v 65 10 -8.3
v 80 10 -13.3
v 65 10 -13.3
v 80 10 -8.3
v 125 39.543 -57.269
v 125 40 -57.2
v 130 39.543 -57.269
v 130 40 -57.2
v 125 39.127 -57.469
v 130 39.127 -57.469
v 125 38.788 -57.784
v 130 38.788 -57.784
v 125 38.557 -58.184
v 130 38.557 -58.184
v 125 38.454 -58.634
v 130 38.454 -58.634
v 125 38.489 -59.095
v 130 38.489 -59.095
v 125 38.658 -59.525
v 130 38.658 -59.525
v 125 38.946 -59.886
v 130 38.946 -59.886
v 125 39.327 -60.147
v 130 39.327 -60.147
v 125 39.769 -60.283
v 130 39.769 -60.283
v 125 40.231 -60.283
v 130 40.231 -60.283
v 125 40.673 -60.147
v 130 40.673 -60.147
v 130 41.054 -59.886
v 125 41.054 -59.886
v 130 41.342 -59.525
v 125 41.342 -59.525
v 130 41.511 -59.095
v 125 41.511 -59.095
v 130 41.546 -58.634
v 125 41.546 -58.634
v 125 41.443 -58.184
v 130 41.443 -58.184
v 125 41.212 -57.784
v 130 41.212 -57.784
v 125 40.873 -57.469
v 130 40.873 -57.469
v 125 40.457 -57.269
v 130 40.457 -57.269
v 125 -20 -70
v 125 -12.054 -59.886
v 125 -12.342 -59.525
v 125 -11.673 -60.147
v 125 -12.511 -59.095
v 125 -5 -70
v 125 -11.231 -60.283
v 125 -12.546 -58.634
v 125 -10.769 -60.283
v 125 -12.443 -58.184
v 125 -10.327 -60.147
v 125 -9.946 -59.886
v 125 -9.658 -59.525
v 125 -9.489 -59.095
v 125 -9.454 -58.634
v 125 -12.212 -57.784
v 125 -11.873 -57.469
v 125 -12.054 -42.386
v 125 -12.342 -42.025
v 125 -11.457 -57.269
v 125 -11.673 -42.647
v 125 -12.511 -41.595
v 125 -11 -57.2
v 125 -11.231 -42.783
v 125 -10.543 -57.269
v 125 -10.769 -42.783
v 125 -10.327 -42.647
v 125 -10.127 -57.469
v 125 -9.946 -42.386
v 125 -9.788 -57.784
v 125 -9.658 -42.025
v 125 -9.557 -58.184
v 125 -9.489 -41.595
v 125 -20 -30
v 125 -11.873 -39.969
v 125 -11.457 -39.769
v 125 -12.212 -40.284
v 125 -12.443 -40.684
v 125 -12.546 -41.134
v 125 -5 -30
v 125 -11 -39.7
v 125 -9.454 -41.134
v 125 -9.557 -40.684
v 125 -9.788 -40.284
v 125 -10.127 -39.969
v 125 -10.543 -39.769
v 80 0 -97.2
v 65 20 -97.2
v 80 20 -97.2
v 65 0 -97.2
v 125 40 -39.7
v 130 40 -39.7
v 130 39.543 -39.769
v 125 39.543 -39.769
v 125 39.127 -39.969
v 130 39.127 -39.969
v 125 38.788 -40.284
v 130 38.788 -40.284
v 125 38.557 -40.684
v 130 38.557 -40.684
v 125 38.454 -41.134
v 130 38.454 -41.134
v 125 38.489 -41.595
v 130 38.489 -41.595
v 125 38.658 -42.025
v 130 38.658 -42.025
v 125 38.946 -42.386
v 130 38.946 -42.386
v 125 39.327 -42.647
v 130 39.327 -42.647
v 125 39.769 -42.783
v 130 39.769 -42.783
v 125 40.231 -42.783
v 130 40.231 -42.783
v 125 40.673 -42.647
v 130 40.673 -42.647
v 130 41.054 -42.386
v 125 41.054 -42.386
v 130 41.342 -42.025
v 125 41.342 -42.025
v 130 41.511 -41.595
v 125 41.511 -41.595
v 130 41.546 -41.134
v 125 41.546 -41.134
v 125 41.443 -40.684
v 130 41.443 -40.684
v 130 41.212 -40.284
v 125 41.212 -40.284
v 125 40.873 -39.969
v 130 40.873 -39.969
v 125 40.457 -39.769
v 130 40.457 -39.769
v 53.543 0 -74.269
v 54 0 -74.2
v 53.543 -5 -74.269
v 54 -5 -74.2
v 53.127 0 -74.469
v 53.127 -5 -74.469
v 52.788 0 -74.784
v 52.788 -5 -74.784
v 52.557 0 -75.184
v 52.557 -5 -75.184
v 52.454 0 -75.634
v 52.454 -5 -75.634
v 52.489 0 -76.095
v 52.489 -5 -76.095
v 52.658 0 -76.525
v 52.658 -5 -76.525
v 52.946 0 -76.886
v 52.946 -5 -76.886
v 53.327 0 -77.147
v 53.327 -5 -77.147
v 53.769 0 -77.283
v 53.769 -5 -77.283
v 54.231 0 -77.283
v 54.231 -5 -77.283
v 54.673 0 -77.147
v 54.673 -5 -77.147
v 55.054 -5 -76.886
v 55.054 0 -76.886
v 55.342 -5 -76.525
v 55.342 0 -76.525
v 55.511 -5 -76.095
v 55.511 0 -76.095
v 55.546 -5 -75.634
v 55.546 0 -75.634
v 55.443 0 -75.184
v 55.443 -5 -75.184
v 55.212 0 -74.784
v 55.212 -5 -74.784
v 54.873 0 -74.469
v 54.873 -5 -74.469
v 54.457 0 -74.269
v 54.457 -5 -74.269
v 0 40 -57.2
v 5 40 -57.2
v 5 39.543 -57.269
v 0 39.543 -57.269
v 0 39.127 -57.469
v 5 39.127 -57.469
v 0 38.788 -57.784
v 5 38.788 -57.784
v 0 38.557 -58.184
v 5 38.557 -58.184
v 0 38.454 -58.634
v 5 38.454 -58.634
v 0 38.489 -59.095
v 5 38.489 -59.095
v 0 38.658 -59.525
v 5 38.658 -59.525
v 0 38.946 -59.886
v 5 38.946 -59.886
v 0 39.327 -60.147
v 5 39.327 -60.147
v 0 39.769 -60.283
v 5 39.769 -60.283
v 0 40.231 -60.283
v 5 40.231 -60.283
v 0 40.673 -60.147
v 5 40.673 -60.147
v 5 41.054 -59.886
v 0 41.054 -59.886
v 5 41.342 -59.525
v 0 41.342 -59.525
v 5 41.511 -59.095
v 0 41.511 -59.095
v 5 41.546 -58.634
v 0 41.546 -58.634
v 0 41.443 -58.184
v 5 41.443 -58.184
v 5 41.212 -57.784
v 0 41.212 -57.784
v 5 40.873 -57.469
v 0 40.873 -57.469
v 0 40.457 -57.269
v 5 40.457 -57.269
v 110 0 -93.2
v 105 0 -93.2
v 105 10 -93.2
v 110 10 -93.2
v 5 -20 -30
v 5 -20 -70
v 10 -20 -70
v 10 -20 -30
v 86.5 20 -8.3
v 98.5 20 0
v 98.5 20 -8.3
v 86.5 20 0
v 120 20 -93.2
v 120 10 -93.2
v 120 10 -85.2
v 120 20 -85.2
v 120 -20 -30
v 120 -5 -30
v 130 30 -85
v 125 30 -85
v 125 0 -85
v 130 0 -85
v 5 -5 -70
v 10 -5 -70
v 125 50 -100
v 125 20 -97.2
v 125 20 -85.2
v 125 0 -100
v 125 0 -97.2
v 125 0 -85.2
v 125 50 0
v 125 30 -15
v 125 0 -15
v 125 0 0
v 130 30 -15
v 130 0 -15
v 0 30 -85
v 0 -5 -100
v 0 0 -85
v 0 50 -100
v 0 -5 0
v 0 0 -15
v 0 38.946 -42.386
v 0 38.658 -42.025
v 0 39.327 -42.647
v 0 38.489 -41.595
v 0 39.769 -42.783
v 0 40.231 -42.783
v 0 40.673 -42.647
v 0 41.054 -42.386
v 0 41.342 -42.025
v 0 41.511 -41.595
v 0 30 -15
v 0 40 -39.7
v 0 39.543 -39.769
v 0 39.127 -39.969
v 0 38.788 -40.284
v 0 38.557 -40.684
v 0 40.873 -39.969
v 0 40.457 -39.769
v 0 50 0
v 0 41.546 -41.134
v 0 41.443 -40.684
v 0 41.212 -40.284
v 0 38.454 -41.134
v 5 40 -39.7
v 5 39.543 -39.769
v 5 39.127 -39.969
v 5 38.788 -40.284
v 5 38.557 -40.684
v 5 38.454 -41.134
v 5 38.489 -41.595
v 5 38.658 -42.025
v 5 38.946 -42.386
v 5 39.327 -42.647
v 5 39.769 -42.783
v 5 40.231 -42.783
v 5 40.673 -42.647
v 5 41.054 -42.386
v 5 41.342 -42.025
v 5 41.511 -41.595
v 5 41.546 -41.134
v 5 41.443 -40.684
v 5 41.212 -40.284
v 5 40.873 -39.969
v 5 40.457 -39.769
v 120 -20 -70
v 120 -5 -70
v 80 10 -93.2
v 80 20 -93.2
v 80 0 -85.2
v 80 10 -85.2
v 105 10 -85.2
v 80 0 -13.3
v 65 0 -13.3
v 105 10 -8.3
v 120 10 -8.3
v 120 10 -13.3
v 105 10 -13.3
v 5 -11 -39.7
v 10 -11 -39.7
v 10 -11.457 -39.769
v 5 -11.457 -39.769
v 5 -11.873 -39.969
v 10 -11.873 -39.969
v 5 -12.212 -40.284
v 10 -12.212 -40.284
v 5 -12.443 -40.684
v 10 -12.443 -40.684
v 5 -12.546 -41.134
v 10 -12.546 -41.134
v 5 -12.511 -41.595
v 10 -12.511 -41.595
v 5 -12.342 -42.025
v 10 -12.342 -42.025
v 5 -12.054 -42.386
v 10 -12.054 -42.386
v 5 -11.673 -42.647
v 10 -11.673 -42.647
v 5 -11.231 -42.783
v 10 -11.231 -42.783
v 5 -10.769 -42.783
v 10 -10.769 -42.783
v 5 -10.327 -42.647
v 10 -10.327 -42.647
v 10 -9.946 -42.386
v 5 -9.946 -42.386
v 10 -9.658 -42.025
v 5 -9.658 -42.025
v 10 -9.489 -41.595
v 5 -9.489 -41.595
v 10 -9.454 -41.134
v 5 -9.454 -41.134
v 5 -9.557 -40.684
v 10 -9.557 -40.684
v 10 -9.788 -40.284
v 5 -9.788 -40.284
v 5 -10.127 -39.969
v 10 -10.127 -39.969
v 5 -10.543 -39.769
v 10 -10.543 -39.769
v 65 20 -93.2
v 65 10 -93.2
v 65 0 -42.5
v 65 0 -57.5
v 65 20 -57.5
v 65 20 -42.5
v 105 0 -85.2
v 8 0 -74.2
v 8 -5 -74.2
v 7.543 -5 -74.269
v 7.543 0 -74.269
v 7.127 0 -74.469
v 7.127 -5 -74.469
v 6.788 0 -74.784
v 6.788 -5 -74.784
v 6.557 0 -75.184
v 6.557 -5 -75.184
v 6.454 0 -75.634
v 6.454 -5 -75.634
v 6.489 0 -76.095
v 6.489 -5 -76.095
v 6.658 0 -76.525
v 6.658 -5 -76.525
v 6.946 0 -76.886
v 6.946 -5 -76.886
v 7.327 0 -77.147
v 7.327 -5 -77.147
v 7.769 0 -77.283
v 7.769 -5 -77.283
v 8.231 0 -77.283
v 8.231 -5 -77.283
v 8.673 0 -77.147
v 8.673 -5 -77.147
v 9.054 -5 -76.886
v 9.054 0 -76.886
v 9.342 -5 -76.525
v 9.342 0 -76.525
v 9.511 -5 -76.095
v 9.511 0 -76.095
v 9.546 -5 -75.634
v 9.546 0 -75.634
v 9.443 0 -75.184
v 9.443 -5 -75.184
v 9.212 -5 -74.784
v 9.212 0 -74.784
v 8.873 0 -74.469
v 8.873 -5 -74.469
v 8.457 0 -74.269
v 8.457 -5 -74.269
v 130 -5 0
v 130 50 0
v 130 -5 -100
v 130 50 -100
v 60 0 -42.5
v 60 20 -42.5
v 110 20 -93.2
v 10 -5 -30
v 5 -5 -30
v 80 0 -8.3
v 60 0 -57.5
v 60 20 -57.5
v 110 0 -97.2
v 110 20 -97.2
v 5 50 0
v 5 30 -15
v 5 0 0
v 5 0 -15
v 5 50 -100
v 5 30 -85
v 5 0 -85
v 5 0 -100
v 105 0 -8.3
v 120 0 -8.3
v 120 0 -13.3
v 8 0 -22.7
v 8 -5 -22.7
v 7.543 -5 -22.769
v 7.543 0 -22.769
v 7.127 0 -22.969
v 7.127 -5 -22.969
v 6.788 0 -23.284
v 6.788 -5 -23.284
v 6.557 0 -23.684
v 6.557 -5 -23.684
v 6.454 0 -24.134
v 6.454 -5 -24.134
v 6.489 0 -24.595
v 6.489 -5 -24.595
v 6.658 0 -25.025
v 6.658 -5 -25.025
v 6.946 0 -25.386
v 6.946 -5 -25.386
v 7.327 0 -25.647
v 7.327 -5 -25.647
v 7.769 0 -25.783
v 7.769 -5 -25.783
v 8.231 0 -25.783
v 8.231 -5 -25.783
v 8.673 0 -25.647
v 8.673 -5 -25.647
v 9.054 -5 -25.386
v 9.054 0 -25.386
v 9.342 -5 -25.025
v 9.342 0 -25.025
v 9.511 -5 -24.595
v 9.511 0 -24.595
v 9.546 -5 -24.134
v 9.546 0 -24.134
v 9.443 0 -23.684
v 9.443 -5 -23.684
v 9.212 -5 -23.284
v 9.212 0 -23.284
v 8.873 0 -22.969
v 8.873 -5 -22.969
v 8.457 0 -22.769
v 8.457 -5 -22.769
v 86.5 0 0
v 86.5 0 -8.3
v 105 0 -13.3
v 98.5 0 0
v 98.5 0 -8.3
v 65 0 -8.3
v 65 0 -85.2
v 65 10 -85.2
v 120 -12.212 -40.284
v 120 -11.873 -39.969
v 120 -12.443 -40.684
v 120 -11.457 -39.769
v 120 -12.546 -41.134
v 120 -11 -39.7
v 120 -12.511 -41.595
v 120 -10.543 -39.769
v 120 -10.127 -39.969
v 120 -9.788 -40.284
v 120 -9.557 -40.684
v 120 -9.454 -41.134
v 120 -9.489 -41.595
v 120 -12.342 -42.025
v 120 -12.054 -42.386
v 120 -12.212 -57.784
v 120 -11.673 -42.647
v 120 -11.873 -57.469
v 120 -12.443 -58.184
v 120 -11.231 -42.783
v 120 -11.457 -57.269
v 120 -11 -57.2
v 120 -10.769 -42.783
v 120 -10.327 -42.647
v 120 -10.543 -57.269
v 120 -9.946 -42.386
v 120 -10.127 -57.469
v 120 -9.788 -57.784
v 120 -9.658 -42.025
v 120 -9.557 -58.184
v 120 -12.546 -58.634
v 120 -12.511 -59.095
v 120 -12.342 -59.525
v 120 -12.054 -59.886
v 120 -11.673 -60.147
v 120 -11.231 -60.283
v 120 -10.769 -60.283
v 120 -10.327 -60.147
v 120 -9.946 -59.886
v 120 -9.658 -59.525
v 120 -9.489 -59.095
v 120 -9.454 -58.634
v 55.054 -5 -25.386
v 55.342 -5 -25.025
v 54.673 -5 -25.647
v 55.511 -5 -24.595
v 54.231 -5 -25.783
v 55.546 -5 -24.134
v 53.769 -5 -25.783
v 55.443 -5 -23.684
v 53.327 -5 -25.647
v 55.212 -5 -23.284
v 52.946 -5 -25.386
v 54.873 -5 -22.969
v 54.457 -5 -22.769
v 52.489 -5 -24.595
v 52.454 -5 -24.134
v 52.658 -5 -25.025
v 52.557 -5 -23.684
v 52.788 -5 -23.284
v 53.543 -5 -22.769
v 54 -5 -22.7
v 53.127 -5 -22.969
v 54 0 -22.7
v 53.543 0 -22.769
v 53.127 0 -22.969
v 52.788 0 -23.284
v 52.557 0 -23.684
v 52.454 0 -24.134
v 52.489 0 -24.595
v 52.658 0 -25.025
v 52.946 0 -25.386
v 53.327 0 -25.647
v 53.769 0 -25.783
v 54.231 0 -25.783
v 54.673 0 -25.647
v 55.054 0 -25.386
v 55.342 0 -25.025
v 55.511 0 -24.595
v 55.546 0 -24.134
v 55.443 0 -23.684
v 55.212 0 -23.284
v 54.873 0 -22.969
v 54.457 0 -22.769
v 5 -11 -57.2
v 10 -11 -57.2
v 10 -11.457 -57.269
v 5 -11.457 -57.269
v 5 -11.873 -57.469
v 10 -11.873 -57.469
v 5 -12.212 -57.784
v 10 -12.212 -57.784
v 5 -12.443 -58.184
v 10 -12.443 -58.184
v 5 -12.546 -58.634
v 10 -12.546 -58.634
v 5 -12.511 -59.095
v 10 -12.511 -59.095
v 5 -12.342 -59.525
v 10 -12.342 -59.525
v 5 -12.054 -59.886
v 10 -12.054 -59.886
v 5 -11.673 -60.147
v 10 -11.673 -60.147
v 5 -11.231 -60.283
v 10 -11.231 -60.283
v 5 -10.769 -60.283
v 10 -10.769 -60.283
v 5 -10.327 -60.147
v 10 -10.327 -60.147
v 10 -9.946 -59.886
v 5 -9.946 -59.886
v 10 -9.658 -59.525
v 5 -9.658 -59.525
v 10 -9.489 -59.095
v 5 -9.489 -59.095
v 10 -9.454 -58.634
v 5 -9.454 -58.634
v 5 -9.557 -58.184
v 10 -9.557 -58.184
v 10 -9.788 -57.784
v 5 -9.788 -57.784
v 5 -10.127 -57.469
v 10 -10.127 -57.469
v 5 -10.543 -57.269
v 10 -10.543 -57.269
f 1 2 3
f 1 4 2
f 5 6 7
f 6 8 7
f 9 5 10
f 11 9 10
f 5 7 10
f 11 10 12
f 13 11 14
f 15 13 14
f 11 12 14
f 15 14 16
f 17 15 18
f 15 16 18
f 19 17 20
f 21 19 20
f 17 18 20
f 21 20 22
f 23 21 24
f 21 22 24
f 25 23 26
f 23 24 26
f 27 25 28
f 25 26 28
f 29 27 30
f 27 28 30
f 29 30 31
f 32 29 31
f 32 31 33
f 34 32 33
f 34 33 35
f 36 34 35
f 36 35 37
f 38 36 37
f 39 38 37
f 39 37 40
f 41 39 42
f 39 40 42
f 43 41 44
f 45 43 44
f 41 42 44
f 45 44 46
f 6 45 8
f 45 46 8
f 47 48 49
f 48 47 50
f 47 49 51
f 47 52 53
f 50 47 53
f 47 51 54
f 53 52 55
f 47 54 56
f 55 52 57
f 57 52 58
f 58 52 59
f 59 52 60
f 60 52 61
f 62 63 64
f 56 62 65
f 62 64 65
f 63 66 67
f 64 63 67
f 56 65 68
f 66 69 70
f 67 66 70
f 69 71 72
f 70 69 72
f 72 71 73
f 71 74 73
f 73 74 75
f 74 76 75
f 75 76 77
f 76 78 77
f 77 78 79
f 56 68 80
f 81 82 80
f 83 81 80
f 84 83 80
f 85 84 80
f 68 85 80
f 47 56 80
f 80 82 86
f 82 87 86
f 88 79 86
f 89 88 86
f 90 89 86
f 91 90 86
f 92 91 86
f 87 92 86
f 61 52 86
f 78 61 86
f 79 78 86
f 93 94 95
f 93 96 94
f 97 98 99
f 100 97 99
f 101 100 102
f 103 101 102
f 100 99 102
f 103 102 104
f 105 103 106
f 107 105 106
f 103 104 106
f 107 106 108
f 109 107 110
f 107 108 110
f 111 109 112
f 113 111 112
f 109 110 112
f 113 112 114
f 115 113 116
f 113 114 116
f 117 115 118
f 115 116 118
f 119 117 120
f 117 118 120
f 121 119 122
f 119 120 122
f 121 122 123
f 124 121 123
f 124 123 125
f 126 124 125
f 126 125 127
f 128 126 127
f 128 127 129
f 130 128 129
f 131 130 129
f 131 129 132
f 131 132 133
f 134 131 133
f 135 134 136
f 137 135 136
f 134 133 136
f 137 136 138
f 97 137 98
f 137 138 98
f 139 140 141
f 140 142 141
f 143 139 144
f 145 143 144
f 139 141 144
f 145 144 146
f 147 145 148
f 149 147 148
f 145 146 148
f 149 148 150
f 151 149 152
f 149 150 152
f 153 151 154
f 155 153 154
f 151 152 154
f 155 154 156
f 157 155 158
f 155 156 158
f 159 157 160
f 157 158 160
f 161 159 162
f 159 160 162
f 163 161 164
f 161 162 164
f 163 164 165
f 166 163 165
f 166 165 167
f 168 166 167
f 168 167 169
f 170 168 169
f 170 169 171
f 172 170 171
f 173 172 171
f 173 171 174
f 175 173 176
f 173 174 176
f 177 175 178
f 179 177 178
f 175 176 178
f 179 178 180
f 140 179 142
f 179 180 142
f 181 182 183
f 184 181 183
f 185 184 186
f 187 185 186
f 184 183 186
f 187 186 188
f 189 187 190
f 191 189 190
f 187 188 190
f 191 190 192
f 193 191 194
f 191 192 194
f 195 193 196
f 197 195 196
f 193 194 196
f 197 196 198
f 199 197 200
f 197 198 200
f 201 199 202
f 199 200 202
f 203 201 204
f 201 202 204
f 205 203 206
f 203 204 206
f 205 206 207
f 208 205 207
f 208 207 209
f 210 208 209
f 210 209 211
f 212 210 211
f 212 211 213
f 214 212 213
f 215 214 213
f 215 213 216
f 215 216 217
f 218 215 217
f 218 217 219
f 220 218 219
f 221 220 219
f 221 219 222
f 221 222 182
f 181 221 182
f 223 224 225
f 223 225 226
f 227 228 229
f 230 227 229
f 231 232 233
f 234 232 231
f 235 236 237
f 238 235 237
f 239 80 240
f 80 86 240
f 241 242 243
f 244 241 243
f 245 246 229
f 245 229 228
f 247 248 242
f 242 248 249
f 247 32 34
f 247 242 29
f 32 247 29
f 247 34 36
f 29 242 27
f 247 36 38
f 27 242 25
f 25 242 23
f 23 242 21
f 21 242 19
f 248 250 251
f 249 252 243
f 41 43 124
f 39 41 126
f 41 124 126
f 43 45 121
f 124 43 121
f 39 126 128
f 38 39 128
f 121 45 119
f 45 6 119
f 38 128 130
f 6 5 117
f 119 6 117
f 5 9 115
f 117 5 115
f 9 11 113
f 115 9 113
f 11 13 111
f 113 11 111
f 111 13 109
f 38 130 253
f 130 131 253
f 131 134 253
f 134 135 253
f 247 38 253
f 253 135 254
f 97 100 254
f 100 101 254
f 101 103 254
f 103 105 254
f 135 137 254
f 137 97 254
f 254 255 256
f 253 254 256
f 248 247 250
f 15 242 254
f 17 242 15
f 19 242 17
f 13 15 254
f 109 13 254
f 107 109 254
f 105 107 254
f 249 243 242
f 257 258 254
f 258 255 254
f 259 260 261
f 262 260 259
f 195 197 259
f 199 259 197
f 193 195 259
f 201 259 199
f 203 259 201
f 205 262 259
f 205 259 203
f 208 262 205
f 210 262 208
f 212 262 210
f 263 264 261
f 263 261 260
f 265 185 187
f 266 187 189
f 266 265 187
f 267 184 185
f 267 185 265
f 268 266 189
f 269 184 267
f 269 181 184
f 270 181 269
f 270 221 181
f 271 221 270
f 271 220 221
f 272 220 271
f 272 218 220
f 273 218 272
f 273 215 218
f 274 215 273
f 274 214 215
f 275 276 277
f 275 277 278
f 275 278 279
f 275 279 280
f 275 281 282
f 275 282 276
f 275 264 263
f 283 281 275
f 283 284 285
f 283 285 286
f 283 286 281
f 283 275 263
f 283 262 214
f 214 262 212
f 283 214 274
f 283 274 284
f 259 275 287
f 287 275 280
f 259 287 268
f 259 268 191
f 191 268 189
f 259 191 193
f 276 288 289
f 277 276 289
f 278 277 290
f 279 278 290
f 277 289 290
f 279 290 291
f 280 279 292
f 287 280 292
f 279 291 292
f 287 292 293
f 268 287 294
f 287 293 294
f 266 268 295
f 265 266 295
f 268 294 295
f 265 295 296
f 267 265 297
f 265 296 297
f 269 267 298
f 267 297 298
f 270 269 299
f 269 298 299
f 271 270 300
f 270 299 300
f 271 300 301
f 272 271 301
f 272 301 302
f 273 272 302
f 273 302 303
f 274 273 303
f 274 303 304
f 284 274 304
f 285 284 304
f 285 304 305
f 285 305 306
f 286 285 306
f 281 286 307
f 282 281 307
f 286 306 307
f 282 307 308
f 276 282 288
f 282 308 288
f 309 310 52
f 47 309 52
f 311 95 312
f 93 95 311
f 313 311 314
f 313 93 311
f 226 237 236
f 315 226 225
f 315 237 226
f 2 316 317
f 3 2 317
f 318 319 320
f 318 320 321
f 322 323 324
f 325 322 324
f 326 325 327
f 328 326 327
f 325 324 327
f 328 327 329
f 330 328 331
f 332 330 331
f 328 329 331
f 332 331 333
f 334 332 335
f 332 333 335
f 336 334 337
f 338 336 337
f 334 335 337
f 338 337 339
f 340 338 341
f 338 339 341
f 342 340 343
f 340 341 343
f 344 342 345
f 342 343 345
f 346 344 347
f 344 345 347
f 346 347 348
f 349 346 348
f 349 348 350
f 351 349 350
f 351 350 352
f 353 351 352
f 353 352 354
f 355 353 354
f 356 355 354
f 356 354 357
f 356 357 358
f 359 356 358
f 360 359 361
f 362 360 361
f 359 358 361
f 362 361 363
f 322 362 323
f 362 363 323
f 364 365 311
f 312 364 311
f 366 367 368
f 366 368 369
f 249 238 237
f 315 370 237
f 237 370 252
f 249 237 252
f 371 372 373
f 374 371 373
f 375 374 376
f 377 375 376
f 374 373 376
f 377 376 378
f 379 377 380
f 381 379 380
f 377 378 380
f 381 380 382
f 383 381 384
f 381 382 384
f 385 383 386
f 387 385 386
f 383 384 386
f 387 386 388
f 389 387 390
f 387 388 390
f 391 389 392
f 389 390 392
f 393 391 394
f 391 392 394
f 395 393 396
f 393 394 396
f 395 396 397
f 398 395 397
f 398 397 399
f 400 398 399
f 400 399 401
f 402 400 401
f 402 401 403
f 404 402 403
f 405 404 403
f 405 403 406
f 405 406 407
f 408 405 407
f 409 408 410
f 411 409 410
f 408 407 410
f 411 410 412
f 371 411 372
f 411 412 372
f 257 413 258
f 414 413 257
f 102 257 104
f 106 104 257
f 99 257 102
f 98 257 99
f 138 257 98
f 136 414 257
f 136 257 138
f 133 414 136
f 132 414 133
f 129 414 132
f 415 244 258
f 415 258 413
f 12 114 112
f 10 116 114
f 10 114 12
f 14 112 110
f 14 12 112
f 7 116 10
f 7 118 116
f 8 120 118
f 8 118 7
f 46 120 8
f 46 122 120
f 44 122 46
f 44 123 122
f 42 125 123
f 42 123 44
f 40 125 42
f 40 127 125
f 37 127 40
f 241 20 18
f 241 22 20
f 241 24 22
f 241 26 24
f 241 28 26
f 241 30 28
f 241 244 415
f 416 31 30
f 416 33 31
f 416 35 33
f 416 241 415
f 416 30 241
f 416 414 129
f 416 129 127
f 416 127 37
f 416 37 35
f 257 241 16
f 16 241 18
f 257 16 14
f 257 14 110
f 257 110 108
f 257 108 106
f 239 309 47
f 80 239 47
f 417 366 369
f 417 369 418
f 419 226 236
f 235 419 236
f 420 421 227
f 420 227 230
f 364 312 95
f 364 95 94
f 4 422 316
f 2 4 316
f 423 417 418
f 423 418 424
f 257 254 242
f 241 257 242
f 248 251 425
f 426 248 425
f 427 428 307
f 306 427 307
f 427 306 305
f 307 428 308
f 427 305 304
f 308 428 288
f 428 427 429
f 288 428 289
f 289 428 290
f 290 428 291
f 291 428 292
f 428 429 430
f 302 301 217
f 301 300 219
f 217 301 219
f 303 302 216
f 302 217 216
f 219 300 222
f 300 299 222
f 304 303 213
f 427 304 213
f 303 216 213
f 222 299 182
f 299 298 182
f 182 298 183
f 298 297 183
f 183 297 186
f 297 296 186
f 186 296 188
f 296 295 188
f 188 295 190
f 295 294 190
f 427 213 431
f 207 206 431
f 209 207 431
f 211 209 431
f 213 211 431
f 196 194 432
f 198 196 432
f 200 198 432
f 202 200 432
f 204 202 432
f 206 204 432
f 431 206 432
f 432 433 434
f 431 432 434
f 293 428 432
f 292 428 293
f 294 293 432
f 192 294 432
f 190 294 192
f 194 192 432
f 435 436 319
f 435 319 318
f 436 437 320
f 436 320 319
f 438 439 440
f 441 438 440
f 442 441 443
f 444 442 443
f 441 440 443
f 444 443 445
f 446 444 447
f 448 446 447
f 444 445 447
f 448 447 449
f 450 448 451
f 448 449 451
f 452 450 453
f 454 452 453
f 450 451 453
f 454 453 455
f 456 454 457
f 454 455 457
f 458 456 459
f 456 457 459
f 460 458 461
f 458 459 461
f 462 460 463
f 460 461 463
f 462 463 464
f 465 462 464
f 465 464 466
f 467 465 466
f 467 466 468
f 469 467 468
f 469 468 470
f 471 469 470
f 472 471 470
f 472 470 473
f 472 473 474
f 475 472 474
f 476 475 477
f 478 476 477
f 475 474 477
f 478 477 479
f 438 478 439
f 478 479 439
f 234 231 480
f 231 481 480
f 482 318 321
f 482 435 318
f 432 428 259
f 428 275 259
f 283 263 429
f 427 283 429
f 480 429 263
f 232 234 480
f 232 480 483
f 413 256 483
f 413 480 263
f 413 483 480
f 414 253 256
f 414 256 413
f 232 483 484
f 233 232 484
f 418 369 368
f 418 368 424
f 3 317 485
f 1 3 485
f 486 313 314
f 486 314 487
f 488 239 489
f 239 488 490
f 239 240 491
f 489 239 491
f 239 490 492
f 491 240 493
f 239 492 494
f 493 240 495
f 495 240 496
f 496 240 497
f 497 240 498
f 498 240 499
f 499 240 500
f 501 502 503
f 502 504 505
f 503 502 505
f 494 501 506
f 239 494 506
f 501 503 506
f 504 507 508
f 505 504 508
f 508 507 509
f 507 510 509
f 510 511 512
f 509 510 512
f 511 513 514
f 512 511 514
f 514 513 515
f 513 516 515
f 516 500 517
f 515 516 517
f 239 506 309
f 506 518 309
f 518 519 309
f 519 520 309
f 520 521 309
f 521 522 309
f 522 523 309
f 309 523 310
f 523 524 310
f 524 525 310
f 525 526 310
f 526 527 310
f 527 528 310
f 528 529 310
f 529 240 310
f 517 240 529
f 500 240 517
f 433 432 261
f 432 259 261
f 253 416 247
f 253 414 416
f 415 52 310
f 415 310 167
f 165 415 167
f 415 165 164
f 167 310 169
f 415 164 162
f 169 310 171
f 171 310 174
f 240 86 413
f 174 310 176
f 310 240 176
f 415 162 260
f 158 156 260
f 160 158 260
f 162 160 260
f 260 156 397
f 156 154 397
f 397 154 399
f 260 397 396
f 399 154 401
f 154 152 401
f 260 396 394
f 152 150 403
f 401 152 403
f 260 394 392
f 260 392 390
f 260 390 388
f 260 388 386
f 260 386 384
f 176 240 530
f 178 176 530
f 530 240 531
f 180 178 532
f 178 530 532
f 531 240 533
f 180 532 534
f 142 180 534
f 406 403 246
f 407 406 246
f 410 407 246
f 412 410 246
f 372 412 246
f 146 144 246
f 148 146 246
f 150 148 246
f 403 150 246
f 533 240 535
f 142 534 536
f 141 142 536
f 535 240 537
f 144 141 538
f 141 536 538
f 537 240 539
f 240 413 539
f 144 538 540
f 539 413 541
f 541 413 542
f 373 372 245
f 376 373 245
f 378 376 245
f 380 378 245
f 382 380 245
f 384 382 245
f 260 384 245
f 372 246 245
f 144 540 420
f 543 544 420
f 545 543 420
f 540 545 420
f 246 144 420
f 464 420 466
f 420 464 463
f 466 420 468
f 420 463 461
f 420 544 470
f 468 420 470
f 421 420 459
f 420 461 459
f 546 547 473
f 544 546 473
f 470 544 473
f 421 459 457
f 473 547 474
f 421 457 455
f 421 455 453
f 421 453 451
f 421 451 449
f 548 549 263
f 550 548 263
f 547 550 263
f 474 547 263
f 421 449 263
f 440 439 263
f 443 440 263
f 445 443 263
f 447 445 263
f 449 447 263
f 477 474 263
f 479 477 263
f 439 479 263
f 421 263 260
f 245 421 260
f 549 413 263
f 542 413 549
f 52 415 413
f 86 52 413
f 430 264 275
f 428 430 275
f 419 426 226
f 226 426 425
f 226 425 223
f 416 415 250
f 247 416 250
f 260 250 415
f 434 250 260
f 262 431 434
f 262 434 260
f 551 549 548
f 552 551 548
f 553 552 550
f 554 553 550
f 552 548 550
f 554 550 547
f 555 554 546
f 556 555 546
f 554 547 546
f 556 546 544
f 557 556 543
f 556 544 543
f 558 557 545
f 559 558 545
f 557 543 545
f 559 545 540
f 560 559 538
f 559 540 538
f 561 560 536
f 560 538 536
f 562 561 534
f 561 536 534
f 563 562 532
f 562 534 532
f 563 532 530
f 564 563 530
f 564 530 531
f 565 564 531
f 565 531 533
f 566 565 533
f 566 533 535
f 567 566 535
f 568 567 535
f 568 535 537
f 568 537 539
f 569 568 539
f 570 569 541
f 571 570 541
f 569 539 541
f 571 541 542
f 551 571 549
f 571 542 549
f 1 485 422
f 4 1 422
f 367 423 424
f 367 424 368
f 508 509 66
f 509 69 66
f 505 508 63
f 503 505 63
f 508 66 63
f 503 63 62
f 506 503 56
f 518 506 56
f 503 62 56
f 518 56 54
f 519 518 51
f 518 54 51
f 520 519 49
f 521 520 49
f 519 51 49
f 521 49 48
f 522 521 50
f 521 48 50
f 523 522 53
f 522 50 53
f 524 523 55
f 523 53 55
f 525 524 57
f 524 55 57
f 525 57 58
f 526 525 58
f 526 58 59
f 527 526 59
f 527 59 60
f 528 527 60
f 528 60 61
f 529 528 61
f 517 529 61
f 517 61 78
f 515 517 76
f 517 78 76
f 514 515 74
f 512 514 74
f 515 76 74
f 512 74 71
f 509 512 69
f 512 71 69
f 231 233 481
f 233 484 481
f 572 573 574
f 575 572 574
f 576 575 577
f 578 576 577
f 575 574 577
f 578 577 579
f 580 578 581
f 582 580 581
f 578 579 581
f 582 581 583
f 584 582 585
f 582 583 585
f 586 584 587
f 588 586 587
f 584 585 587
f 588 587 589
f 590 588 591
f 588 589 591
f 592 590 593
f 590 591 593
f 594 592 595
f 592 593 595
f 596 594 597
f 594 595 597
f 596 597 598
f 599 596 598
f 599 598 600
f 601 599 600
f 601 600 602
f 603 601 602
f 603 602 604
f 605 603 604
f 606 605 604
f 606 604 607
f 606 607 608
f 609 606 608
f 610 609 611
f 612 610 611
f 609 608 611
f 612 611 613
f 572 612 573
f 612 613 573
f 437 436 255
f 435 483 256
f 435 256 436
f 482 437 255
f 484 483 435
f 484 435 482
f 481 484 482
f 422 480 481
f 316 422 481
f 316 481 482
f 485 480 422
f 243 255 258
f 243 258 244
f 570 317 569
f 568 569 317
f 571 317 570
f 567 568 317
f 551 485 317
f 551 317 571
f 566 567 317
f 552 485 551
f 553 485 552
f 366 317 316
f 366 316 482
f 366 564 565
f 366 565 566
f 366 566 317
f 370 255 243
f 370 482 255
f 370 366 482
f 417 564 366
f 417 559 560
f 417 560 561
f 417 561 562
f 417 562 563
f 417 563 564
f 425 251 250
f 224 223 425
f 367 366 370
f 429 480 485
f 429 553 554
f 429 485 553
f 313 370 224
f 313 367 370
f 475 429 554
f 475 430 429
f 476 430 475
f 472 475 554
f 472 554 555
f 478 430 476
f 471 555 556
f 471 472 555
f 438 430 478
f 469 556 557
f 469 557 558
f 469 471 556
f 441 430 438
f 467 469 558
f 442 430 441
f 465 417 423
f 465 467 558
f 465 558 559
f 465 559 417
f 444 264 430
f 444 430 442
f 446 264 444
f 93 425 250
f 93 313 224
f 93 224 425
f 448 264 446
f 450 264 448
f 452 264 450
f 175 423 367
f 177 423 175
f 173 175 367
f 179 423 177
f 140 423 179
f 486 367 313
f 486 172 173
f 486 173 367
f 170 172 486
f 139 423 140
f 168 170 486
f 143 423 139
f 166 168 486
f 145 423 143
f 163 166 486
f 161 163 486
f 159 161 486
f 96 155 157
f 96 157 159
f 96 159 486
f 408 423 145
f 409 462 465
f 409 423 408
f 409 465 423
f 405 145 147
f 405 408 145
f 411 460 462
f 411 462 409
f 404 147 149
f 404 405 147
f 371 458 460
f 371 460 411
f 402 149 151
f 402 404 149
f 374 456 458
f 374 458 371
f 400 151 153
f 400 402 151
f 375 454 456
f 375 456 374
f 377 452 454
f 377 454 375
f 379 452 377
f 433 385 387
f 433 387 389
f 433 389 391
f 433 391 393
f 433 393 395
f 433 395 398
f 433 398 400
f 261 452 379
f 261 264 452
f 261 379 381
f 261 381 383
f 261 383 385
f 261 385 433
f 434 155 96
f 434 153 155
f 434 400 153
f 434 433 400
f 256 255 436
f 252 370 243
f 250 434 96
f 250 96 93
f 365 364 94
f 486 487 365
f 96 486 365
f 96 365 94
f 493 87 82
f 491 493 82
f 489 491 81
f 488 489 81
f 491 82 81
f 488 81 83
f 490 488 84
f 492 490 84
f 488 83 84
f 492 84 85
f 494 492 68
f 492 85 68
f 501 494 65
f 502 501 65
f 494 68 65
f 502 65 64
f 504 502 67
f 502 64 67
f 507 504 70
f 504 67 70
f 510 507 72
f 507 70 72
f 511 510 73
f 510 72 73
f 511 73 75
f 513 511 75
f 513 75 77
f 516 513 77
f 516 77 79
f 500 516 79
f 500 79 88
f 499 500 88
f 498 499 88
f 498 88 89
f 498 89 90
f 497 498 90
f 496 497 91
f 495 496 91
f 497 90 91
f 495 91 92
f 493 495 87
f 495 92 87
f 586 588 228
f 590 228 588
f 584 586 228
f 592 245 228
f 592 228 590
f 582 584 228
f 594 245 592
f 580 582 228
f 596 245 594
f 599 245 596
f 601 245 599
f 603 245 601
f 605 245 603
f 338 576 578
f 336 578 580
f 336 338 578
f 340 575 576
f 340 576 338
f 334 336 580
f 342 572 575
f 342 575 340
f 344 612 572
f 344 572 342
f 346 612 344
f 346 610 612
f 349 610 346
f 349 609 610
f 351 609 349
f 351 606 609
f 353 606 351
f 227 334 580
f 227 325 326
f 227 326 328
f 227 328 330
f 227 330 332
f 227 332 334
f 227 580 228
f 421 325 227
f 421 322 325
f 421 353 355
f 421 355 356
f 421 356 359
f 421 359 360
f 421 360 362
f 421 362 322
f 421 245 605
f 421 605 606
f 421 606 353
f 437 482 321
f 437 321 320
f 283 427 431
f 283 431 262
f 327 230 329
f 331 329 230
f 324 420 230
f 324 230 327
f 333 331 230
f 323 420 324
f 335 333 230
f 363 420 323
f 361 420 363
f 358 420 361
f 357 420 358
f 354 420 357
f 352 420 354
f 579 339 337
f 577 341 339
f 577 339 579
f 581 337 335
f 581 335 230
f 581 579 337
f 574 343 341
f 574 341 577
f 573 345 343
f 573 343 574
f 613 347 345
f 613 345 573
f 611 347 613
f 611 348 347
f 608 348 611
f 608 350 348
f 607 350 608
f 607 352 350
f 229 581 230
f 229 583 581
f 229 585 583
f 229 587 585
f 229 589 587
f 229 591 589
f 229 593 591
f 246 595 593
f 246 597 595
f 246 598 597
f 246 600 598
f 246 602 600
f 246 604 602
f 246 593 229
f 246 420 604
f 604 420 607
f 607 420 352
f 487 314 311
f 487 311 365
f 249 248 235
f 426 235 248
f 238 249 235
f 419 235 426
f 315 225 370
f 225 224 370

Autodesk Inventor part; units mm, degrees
ref_plane "YZ Plane" through (0, 0, 0) normal (1, 0, 0) x (0, 1, 0)
ref_plane "XZ Plane" through (0, 0, 0) normal (0, 1, 0) x (-1, 0, 0)
sketch "Sketch1" plane through (0, 0, 0) normal (0, 1, 0) x (-1, 0, 0)
  line L0 (0, 0) -> (-130, 0)
  line L1 (-130, 0) -> (-130, -100)
  line L2 (-130, -100) -> (0, -100)
  line L3 (0, -100) -> (0, 0)
  line L4 (-5, -21) -> (-57, -21) construction
  line L5 (-65, -21) -> (-65, -79) construction
  line L6 (-57, -79) -> (-5, -79) construction
  line L7 (-5, -79) -> (-5, -21) construction
  line L8 (-65, -91.7) -> (-120, -91.7) construction
  line L9 (-120, -91.7) -> (-120, -8.3) construction
  line L10 (-120, -8.3) -> (-65, -8.3) construction
  line L11 (-65, -8.3) -> (-65, -91.7) construction
  line L12 (-5, 0) -> (-5, -100)
  line L13 (-125, -100) -> (-125, 0)
  line L14 (-86.5, 0) -> (-98.5, 0)
  line L15 (-98.5, 0) -> (-98.5, -8.3)
  line L16 (-98.5, -8.3) -> (-86.5, -8.3)
  line L17 (-86.5, -8.3) -> (-86.5, 0)
  line L18 (-87.5, -100) -> (-97.5, -100)
  line L19 (-110, -93.2) -> (-120, -93.2)
  line L20 (-120, -93.2) -> (-120, -85.2)
  line L21 (-120, -85.2) -> (-125, -85.2)
  line L22 (-125, -85.2) -> (-125, -97.2)
  line L23 (-125, -97.2) -> (-110, -97.2)
  line L24 (-110, -97.2) -> (-110, -93.2)
  line L25 (-57, -79) -> (-57, -21) construction
  line L26 (-120, -8.3) -> (-105, -8.3)
  line L27 (-105, -8.3) -> (-105, -13.3)
  line L28 (-105, -13.3) -> (-120, -13.3)
  line L29 (-120, -13.3) -> (-120, -8.3)
  line L30 (-65, -8.3) -> (-80, -8.3)
  line L31 (-80, -8.3) -> (-80, -13.3)
  line L32 (-80, -13.3) -> (-65, -13.3)
  line L33 (-65, -13.3) -> (-65, -8.3)
  line L34 (-120, -91.7) -> (-105, -91.7)
  line L35 (-105, -91.7) -> (-105, -85.2)
  line L36 (-105, -85.2) -> (-120, -85.2)
  line L37 (-120, -85.2) -> (-120, -91.7)
  line L38 (-65, -91.7) -> (-80, -91.7)
  line L39 (-80, -91.7) -> (-80, -85.2)
  line L40 (-80, -85.2) -> (-65, -85.2)
  line L41 (-65, -85.2) -> (-65, -91.7)
  line L42 (-65, -42.5) -> (-60, -42.5)
  line L43 (-60, -42.5) -> (-60, -57.5)
  line L44 (-60, -57.5) -> (-65, -57.5)
  line L45 (-65, -57.5) -> (-65, -42.5)
  line L46 (-54, -75.75) -> (-8, -75.75) construction
  line L47 (-8, -75.75) -> (-8, -24.25) construction
  line L48 (-120, -91.7) -> (-105, -91.7)
  line L49 (-105, -91.7) -> (-105, -93.2)
  line L50 (-105, -93.2) -> (-120, -93.2)
  line L51 (-120, -93.2) -> (-120, -91.7)
  line L52 (-80, -91.7) -> (-65, -91.7)
  line L53 (-65, -91.7) -> (-65, -93.2)
  line L54 (-65, -93.2) -> (-80, -93.2)
  line L55 (-80, -93.2) -> (-80, -91.7)
  line L56 (-80, -93.2) -> (-65, -93.2)
  line L57 (-65, -93.2) -> (-65, -97.2)
  line L58 (-65, -97.2) -> (-80, -97.2)
  line L59 (-80, -97.2) -> (-80, -93.2)
  point P0 (0, -50)
  point P1 (-65, -50)
  point P2 (-65, -100)
  point P3 (-120, -50)
  point P4 (-120, -50)
  point P5 (-54, -24.25)
  point P6 (-92.5, -8.3)
  point P7 (-92.5, -8.3)
  point P8 (-86.5, 0)
  point P9 (-98.5, 0)
  point P10 (-45, -100)
  point P11 (-95, -100)
  point P12 (-92.5, -91.7)
  point P13 (-110, -95.2)
  point P14 (-115, -93.2)
  point P15 (-125, -85.2)
  point P16 (-125, -97.2)
  point P17 (-5, -50)
  point P18 (-57, -50)
  point P19 (-65, -50)
  point P20 (-31, -75.75)
  point P21 (-31, -79)
  point P22 (-8, -50)
  point P23 (-75, -93)
  point P24 (-65, -93)
  point P25 (-72.5, -97.2)
  point P26 (-65, -93.2)
  dimension "d0" = 100
  dimension "d1" = 130
  dimension "d2" = 52
  dimension "d3" = 58
  dimension "d5" = 55
  dimension "d6" = 83.4
  dimension "d10" = 5
  dimension "d11" = 5
  dimension "d16" = 12
  dimension "d17" = 8.3
  dimension "d88" = 10
  dimension "d89" = 5
  dimension "d90" = 4
  dimension "d92" = 8
  dimension "d93" = 1.5
  dimension "d101" = 15
  dimension "d102" = 15
  dimension "d103" = 6.5
  dimension "d104" = 5
  dimension "d105" = 15
  dimension "d111" = 0
  dimension "d112" = 15
  dimension "d113" = 5
  dimension "d116" = 46
  dimension "d117" = 51.5
extrude "Extrusion2" add sketch "Sketch1" against normal blind 5 contours L3 L2 L12 L0 | L12 L2 L13 L23 L24 L50 L49 L35 L36 L21 L0 L15 L16 L17 | L17 L16 L15 L0 | L13 L2 L1 L0 | L21 L20 L19 L24 L23 L13 | L36 L35 L34 L20 | L34 L49 L50 L19 L20 | L26 L27 L28 L29 | L33 L32 L31 L30 | L53 L54 L55 L38 | L38 L39 L40 L41 | L57 L58 L59 L54 | L42 L43 L44 L45
hole "Hole1" at (8, 0, -75.75) at (8, 0, -24.25) at (54, 0, -75.75) at (54, 0, -24.25) direction (0, -1, 0) diameter 3.1 end through all
extrude "Extrusion5" add sketch "Sketch1" along normal blind 50 contours L3 L2 L12 L0 | L13 L2 L1 L0
extrude "Extrusion6" add sketch "Sketch1" along normal blind 20 contours L17 L16 L15 L0 | L21 L20 L19 L24 L23 L13
ref_plane "Work Plane1" through (65, -5, 0) normal (-1, 0, 0) x (0, 0, 1)
sketch "Sketch5" plane through (0, -5, 0) normal (0, -1, 0) x (1, 0, 0)
  line L0 (130, 0) -> (0, 0) projected
  line L1 (65, 0) -> (65, -100)
  line L2 (0, -100) -> (130, -100) projected
  line L3 (5, -30) -> (10, -30)
  line L4 (10, -30) -> (10, -70)
  line L5 (10, -70) -> (5, -70)
  line L6 (5, -70) -> (5, -30)
  line L7 (125, -30) -> (120, -30)
  line L8 (120, -30) -> (120, -70)
  line L9 (120, -70) -> (125, -70)
  line L10 (125, -70) -> (125, -30)
  point P0 (65, -50)
  point P1 (10, -50)
  dimension "d60" = 40
  dimension "d61" = 5
  dimension "d62" = 55
extrude "Extrusion9" add sketch "Sketch5" along normal blind 15
sketch "Sketch6" plane through (5, -5, -70) normal (-1, 0, 0) x (0, 0, 1)
  line L0 (11.25, -6) -> (28.75, -6) construction
  line L1 (70, 0) -> (-30, 0) projected
  line L2 (11.25, 36) -> (28.75, 36)
  point P0 (70, 5)
  point P1 (20, 0)
  point P2 (20, -6)
  dimension "d65" = 17.5
  dimension "d66" = 6
  dimension "d74" = 17.5
hole "Hole2" at (5, -11, -58.75) at (5, -11, -41.25) direction (1, 0, 0) diameter 3.1 end through all
sketch "Sketch7" plane through (0, -5, -100) normal (-1, 0, 0) x (0, 0, 1)
  line L0 (41.25, 45) -> (58.75, 45) construction
  line L1 (100, 0) -> (0, 0) projected
  line L2 (0, 55) -> (100, 55) projected
  point P0 (100, 5)
  point P1 (50, 45)
  point P2 (50, 0)
  dimension "d75" = 17.5
  dimension "d76" = 10
hole "Hole3" at (0, 40, -58.75) at (0, 40, -41.25) direction (1, 0, 0) diameter 3.1 end through all
sketch "Sketch8" plane through (0, -5, -100) normal (-1, 0, 0) x (0, 0, 1)
  line L0 (100, 5) -> (0, 5) projected
  line L1 (15, 5) -> (85, 5)
  line L2 (85, 5) -> (85, 35)
  line L3 (85, 35) -> (15, 35)
  line L4 (15, 35) -> (15, 5)
  line L5 (0, 55) -> (100, 55) projected
  point P0 (14.8, 5)
  point P1 (50, 35)
  point P2 (50, 55)
  dimension "d95" = 70
  dimension "d96" = 30
extrude "Extrusion10" cut sketch "Sketch8" against normal through all
extrude "Extrusion11" add sketch "Sketch1" along normal blind 10 contours L36 L35 L34 L20 | L34 L49 L50 L19 L20 | L26 L27 L28 L29 | L33 L32 L31 L30 | L53 L54 L55 L38 | L38 L39 L40 L41
extrude "Extrusion13" add sketch "Sketch1" along normal blind 20 contours L57 L58 L59 L54 | L42 L43 L44 L45
properties part number "Chasis 2"
